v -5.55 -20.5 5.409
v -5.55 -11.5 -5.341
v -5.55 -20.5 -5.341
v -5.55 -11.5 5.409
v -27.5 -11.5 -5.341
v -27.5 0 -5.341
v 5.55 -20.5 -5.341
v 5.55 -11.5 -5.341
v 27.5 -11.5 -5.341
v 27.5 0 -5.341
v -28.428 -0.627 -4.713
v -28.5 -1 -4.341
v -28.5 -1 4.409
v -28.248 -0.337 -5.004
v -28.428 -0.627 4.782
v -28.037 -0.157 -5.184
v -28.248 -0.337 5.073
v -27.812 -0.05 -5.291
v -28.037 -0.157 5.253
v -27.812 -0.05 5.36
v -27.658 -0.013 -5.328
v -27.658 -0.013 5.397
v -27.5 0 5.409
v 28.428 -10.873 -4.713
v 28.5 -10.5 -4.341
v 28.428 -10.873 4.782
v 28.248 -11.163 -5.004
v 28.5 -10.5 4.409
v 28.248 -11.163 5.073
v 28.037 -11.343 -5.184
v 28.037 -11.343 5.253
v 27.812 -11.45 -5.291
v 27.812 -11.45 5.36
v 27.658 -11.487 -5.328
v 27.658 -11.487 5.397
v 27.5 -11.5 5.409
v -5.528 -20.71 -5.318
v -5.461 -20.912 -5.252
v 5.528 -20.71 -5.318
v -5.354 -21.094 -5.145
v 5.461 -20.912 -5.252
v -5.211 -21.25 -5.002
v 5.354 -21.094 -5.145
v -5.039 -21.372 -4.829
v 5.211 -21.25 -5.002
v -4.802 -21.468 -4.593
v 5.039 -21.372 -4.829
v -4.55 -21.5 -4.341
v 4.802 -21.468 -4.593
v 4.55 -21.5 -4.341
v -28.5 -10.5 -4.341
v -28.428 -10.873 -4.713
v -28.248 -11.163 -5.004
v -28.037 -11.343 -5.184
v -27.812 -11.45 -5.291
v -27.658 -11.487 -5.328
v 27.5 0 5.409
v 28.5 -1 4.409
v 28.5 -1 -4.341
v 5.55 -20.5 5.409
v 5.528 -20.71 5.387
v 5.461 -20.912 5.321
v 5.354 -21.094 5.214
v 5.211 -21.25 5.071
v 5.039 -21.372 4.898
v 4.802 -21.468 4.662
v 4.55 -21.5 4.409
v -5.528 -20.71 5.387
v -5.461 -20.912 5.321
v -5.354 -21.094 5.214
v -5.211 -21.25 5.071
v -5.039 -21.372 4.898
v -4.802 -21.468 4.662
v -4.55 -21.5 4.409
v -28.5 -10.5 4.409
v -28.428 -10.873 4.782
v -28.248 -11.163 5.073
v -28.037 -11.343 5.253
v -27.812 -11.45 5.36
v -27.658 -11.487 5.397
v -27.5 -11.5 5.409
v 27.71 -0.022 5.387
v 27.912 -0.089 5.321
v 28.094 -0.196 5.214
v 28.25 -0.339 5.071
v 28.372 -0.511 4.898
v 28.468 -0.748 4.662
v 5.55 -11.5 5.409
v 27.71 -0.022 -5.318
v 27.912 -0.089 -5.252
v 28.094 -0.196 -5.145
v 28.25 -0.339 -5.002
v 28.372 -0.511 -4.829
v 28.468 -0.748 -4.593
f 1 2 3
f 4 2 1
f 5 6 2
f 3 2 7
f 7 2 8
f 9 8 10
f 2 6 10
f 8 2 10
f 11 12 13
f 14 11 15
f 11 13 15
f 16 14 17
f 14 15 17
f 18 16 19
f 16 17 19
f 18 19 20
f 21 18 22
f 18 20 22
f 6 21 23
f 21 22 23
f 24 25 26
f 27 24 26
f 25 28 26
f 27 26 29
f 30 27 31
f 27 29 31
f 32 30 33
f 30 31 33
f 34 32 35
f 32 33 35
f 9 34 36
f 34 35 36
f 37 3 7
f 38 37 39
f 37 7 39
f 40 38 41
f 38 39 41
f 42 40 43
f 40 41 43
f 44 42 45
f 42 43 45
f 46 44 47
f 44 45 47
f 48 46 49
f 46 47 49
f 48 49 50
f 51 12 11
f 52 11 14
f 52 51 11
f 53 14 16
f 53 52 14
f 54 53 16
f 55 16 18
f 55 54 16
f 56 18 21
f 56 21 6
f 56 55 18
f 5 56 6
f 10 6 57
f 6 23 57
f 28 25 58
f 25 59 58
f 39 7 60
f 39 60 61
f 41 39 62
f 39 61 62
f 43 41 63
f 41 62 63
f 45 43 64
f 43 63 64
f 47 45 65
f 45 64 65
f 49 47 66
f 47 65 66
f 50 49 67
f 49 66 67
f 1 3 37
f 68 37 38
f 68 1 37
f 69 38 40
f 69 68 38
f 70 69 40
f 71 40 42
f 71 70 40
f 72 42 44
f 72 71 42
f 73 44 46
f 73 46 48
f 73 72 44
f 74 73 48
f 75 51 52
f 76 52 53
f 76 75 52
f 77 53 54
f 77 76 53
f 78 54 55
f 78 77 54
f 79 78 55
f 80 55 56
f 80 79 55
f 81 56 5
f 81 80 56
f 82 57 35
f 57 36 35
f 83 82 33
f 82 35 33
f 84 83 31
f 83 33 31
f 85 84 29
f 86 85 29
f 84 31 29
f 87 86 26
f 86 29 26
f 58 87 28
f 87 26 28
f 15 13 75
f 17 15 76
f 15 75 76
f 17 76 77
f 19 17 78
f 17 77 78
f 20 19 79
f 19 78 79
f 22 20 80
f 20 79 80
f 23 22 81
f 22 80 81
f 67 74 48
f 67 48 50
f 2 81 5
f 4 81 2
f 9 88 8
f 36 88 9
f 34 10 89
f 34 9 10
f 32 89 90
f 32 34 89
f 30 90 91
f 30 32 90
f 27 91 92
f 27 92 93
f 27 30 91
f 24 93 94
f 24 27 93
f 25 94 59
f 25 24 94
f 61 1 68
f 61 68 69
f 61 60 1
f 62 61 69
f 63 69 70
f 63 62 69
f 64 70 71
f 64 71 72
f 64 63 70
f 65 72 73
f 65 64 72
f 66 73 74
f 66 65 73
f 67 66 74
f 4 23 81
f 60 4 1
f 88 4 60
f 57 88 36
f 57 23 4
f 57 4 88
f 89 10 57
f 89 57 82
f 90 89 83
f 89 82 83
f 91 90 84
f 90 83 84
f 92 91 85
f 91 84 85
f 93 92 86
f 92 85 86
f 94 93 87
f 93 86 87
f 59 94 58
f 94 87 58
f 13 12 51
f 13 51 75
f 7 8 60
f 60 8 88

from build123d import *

# Parameters (mm, degrees)
F0_W     = 57
F0_H     = 10.75
F1_DEPTH = 11.5
F2_W     = 11.1
F2_H     = 10.75
F3_DEPTH = 10
F4_R     = 1


with BuildPart() as f1:
    # F0 (on Front) → F1 (new body)
    with BuildSketch(Plane.XZ):
        with Locations((0, 0.0343695283)):
            Rectangle(F0_W, F0_H)
    extrude(amount=F1_DEPTH)

    # F2 (on face) → F3 (join)
    with BuildSketch(Plane.XZ.offset(11.5)):
        with Locations((0, 0.0343695283)):
            Rectangle(F2_W, F2_H)
    extrude(amount=F3_DEPTH)

    # F4
    f4_edges = [f1.edges().sort_by_distance(p)[0] for p in [
        (5.55, -21.5, 0.03437),
        (0, -21.5, 5.40937),
        (-5.55, -21.5, 0.03437),
        (0, -21.5, -5.34063),
        (28.5, -11.5, 0.03437),
        (28.5, -5.75, 5.40937),
        (28.5, -5.75, -5.34063),
        (28.5, 0, 0.03437),
        (-28.5, -5.75, 5.40937),
        (-28.5, -11.5, 0.03437),
        (-28.5, -5.75, -5.34063),
        (-28.5, 0, 0.03437),
    ]]
    fillet(f4_edges, radius=F4_R)


solid = f1.part
